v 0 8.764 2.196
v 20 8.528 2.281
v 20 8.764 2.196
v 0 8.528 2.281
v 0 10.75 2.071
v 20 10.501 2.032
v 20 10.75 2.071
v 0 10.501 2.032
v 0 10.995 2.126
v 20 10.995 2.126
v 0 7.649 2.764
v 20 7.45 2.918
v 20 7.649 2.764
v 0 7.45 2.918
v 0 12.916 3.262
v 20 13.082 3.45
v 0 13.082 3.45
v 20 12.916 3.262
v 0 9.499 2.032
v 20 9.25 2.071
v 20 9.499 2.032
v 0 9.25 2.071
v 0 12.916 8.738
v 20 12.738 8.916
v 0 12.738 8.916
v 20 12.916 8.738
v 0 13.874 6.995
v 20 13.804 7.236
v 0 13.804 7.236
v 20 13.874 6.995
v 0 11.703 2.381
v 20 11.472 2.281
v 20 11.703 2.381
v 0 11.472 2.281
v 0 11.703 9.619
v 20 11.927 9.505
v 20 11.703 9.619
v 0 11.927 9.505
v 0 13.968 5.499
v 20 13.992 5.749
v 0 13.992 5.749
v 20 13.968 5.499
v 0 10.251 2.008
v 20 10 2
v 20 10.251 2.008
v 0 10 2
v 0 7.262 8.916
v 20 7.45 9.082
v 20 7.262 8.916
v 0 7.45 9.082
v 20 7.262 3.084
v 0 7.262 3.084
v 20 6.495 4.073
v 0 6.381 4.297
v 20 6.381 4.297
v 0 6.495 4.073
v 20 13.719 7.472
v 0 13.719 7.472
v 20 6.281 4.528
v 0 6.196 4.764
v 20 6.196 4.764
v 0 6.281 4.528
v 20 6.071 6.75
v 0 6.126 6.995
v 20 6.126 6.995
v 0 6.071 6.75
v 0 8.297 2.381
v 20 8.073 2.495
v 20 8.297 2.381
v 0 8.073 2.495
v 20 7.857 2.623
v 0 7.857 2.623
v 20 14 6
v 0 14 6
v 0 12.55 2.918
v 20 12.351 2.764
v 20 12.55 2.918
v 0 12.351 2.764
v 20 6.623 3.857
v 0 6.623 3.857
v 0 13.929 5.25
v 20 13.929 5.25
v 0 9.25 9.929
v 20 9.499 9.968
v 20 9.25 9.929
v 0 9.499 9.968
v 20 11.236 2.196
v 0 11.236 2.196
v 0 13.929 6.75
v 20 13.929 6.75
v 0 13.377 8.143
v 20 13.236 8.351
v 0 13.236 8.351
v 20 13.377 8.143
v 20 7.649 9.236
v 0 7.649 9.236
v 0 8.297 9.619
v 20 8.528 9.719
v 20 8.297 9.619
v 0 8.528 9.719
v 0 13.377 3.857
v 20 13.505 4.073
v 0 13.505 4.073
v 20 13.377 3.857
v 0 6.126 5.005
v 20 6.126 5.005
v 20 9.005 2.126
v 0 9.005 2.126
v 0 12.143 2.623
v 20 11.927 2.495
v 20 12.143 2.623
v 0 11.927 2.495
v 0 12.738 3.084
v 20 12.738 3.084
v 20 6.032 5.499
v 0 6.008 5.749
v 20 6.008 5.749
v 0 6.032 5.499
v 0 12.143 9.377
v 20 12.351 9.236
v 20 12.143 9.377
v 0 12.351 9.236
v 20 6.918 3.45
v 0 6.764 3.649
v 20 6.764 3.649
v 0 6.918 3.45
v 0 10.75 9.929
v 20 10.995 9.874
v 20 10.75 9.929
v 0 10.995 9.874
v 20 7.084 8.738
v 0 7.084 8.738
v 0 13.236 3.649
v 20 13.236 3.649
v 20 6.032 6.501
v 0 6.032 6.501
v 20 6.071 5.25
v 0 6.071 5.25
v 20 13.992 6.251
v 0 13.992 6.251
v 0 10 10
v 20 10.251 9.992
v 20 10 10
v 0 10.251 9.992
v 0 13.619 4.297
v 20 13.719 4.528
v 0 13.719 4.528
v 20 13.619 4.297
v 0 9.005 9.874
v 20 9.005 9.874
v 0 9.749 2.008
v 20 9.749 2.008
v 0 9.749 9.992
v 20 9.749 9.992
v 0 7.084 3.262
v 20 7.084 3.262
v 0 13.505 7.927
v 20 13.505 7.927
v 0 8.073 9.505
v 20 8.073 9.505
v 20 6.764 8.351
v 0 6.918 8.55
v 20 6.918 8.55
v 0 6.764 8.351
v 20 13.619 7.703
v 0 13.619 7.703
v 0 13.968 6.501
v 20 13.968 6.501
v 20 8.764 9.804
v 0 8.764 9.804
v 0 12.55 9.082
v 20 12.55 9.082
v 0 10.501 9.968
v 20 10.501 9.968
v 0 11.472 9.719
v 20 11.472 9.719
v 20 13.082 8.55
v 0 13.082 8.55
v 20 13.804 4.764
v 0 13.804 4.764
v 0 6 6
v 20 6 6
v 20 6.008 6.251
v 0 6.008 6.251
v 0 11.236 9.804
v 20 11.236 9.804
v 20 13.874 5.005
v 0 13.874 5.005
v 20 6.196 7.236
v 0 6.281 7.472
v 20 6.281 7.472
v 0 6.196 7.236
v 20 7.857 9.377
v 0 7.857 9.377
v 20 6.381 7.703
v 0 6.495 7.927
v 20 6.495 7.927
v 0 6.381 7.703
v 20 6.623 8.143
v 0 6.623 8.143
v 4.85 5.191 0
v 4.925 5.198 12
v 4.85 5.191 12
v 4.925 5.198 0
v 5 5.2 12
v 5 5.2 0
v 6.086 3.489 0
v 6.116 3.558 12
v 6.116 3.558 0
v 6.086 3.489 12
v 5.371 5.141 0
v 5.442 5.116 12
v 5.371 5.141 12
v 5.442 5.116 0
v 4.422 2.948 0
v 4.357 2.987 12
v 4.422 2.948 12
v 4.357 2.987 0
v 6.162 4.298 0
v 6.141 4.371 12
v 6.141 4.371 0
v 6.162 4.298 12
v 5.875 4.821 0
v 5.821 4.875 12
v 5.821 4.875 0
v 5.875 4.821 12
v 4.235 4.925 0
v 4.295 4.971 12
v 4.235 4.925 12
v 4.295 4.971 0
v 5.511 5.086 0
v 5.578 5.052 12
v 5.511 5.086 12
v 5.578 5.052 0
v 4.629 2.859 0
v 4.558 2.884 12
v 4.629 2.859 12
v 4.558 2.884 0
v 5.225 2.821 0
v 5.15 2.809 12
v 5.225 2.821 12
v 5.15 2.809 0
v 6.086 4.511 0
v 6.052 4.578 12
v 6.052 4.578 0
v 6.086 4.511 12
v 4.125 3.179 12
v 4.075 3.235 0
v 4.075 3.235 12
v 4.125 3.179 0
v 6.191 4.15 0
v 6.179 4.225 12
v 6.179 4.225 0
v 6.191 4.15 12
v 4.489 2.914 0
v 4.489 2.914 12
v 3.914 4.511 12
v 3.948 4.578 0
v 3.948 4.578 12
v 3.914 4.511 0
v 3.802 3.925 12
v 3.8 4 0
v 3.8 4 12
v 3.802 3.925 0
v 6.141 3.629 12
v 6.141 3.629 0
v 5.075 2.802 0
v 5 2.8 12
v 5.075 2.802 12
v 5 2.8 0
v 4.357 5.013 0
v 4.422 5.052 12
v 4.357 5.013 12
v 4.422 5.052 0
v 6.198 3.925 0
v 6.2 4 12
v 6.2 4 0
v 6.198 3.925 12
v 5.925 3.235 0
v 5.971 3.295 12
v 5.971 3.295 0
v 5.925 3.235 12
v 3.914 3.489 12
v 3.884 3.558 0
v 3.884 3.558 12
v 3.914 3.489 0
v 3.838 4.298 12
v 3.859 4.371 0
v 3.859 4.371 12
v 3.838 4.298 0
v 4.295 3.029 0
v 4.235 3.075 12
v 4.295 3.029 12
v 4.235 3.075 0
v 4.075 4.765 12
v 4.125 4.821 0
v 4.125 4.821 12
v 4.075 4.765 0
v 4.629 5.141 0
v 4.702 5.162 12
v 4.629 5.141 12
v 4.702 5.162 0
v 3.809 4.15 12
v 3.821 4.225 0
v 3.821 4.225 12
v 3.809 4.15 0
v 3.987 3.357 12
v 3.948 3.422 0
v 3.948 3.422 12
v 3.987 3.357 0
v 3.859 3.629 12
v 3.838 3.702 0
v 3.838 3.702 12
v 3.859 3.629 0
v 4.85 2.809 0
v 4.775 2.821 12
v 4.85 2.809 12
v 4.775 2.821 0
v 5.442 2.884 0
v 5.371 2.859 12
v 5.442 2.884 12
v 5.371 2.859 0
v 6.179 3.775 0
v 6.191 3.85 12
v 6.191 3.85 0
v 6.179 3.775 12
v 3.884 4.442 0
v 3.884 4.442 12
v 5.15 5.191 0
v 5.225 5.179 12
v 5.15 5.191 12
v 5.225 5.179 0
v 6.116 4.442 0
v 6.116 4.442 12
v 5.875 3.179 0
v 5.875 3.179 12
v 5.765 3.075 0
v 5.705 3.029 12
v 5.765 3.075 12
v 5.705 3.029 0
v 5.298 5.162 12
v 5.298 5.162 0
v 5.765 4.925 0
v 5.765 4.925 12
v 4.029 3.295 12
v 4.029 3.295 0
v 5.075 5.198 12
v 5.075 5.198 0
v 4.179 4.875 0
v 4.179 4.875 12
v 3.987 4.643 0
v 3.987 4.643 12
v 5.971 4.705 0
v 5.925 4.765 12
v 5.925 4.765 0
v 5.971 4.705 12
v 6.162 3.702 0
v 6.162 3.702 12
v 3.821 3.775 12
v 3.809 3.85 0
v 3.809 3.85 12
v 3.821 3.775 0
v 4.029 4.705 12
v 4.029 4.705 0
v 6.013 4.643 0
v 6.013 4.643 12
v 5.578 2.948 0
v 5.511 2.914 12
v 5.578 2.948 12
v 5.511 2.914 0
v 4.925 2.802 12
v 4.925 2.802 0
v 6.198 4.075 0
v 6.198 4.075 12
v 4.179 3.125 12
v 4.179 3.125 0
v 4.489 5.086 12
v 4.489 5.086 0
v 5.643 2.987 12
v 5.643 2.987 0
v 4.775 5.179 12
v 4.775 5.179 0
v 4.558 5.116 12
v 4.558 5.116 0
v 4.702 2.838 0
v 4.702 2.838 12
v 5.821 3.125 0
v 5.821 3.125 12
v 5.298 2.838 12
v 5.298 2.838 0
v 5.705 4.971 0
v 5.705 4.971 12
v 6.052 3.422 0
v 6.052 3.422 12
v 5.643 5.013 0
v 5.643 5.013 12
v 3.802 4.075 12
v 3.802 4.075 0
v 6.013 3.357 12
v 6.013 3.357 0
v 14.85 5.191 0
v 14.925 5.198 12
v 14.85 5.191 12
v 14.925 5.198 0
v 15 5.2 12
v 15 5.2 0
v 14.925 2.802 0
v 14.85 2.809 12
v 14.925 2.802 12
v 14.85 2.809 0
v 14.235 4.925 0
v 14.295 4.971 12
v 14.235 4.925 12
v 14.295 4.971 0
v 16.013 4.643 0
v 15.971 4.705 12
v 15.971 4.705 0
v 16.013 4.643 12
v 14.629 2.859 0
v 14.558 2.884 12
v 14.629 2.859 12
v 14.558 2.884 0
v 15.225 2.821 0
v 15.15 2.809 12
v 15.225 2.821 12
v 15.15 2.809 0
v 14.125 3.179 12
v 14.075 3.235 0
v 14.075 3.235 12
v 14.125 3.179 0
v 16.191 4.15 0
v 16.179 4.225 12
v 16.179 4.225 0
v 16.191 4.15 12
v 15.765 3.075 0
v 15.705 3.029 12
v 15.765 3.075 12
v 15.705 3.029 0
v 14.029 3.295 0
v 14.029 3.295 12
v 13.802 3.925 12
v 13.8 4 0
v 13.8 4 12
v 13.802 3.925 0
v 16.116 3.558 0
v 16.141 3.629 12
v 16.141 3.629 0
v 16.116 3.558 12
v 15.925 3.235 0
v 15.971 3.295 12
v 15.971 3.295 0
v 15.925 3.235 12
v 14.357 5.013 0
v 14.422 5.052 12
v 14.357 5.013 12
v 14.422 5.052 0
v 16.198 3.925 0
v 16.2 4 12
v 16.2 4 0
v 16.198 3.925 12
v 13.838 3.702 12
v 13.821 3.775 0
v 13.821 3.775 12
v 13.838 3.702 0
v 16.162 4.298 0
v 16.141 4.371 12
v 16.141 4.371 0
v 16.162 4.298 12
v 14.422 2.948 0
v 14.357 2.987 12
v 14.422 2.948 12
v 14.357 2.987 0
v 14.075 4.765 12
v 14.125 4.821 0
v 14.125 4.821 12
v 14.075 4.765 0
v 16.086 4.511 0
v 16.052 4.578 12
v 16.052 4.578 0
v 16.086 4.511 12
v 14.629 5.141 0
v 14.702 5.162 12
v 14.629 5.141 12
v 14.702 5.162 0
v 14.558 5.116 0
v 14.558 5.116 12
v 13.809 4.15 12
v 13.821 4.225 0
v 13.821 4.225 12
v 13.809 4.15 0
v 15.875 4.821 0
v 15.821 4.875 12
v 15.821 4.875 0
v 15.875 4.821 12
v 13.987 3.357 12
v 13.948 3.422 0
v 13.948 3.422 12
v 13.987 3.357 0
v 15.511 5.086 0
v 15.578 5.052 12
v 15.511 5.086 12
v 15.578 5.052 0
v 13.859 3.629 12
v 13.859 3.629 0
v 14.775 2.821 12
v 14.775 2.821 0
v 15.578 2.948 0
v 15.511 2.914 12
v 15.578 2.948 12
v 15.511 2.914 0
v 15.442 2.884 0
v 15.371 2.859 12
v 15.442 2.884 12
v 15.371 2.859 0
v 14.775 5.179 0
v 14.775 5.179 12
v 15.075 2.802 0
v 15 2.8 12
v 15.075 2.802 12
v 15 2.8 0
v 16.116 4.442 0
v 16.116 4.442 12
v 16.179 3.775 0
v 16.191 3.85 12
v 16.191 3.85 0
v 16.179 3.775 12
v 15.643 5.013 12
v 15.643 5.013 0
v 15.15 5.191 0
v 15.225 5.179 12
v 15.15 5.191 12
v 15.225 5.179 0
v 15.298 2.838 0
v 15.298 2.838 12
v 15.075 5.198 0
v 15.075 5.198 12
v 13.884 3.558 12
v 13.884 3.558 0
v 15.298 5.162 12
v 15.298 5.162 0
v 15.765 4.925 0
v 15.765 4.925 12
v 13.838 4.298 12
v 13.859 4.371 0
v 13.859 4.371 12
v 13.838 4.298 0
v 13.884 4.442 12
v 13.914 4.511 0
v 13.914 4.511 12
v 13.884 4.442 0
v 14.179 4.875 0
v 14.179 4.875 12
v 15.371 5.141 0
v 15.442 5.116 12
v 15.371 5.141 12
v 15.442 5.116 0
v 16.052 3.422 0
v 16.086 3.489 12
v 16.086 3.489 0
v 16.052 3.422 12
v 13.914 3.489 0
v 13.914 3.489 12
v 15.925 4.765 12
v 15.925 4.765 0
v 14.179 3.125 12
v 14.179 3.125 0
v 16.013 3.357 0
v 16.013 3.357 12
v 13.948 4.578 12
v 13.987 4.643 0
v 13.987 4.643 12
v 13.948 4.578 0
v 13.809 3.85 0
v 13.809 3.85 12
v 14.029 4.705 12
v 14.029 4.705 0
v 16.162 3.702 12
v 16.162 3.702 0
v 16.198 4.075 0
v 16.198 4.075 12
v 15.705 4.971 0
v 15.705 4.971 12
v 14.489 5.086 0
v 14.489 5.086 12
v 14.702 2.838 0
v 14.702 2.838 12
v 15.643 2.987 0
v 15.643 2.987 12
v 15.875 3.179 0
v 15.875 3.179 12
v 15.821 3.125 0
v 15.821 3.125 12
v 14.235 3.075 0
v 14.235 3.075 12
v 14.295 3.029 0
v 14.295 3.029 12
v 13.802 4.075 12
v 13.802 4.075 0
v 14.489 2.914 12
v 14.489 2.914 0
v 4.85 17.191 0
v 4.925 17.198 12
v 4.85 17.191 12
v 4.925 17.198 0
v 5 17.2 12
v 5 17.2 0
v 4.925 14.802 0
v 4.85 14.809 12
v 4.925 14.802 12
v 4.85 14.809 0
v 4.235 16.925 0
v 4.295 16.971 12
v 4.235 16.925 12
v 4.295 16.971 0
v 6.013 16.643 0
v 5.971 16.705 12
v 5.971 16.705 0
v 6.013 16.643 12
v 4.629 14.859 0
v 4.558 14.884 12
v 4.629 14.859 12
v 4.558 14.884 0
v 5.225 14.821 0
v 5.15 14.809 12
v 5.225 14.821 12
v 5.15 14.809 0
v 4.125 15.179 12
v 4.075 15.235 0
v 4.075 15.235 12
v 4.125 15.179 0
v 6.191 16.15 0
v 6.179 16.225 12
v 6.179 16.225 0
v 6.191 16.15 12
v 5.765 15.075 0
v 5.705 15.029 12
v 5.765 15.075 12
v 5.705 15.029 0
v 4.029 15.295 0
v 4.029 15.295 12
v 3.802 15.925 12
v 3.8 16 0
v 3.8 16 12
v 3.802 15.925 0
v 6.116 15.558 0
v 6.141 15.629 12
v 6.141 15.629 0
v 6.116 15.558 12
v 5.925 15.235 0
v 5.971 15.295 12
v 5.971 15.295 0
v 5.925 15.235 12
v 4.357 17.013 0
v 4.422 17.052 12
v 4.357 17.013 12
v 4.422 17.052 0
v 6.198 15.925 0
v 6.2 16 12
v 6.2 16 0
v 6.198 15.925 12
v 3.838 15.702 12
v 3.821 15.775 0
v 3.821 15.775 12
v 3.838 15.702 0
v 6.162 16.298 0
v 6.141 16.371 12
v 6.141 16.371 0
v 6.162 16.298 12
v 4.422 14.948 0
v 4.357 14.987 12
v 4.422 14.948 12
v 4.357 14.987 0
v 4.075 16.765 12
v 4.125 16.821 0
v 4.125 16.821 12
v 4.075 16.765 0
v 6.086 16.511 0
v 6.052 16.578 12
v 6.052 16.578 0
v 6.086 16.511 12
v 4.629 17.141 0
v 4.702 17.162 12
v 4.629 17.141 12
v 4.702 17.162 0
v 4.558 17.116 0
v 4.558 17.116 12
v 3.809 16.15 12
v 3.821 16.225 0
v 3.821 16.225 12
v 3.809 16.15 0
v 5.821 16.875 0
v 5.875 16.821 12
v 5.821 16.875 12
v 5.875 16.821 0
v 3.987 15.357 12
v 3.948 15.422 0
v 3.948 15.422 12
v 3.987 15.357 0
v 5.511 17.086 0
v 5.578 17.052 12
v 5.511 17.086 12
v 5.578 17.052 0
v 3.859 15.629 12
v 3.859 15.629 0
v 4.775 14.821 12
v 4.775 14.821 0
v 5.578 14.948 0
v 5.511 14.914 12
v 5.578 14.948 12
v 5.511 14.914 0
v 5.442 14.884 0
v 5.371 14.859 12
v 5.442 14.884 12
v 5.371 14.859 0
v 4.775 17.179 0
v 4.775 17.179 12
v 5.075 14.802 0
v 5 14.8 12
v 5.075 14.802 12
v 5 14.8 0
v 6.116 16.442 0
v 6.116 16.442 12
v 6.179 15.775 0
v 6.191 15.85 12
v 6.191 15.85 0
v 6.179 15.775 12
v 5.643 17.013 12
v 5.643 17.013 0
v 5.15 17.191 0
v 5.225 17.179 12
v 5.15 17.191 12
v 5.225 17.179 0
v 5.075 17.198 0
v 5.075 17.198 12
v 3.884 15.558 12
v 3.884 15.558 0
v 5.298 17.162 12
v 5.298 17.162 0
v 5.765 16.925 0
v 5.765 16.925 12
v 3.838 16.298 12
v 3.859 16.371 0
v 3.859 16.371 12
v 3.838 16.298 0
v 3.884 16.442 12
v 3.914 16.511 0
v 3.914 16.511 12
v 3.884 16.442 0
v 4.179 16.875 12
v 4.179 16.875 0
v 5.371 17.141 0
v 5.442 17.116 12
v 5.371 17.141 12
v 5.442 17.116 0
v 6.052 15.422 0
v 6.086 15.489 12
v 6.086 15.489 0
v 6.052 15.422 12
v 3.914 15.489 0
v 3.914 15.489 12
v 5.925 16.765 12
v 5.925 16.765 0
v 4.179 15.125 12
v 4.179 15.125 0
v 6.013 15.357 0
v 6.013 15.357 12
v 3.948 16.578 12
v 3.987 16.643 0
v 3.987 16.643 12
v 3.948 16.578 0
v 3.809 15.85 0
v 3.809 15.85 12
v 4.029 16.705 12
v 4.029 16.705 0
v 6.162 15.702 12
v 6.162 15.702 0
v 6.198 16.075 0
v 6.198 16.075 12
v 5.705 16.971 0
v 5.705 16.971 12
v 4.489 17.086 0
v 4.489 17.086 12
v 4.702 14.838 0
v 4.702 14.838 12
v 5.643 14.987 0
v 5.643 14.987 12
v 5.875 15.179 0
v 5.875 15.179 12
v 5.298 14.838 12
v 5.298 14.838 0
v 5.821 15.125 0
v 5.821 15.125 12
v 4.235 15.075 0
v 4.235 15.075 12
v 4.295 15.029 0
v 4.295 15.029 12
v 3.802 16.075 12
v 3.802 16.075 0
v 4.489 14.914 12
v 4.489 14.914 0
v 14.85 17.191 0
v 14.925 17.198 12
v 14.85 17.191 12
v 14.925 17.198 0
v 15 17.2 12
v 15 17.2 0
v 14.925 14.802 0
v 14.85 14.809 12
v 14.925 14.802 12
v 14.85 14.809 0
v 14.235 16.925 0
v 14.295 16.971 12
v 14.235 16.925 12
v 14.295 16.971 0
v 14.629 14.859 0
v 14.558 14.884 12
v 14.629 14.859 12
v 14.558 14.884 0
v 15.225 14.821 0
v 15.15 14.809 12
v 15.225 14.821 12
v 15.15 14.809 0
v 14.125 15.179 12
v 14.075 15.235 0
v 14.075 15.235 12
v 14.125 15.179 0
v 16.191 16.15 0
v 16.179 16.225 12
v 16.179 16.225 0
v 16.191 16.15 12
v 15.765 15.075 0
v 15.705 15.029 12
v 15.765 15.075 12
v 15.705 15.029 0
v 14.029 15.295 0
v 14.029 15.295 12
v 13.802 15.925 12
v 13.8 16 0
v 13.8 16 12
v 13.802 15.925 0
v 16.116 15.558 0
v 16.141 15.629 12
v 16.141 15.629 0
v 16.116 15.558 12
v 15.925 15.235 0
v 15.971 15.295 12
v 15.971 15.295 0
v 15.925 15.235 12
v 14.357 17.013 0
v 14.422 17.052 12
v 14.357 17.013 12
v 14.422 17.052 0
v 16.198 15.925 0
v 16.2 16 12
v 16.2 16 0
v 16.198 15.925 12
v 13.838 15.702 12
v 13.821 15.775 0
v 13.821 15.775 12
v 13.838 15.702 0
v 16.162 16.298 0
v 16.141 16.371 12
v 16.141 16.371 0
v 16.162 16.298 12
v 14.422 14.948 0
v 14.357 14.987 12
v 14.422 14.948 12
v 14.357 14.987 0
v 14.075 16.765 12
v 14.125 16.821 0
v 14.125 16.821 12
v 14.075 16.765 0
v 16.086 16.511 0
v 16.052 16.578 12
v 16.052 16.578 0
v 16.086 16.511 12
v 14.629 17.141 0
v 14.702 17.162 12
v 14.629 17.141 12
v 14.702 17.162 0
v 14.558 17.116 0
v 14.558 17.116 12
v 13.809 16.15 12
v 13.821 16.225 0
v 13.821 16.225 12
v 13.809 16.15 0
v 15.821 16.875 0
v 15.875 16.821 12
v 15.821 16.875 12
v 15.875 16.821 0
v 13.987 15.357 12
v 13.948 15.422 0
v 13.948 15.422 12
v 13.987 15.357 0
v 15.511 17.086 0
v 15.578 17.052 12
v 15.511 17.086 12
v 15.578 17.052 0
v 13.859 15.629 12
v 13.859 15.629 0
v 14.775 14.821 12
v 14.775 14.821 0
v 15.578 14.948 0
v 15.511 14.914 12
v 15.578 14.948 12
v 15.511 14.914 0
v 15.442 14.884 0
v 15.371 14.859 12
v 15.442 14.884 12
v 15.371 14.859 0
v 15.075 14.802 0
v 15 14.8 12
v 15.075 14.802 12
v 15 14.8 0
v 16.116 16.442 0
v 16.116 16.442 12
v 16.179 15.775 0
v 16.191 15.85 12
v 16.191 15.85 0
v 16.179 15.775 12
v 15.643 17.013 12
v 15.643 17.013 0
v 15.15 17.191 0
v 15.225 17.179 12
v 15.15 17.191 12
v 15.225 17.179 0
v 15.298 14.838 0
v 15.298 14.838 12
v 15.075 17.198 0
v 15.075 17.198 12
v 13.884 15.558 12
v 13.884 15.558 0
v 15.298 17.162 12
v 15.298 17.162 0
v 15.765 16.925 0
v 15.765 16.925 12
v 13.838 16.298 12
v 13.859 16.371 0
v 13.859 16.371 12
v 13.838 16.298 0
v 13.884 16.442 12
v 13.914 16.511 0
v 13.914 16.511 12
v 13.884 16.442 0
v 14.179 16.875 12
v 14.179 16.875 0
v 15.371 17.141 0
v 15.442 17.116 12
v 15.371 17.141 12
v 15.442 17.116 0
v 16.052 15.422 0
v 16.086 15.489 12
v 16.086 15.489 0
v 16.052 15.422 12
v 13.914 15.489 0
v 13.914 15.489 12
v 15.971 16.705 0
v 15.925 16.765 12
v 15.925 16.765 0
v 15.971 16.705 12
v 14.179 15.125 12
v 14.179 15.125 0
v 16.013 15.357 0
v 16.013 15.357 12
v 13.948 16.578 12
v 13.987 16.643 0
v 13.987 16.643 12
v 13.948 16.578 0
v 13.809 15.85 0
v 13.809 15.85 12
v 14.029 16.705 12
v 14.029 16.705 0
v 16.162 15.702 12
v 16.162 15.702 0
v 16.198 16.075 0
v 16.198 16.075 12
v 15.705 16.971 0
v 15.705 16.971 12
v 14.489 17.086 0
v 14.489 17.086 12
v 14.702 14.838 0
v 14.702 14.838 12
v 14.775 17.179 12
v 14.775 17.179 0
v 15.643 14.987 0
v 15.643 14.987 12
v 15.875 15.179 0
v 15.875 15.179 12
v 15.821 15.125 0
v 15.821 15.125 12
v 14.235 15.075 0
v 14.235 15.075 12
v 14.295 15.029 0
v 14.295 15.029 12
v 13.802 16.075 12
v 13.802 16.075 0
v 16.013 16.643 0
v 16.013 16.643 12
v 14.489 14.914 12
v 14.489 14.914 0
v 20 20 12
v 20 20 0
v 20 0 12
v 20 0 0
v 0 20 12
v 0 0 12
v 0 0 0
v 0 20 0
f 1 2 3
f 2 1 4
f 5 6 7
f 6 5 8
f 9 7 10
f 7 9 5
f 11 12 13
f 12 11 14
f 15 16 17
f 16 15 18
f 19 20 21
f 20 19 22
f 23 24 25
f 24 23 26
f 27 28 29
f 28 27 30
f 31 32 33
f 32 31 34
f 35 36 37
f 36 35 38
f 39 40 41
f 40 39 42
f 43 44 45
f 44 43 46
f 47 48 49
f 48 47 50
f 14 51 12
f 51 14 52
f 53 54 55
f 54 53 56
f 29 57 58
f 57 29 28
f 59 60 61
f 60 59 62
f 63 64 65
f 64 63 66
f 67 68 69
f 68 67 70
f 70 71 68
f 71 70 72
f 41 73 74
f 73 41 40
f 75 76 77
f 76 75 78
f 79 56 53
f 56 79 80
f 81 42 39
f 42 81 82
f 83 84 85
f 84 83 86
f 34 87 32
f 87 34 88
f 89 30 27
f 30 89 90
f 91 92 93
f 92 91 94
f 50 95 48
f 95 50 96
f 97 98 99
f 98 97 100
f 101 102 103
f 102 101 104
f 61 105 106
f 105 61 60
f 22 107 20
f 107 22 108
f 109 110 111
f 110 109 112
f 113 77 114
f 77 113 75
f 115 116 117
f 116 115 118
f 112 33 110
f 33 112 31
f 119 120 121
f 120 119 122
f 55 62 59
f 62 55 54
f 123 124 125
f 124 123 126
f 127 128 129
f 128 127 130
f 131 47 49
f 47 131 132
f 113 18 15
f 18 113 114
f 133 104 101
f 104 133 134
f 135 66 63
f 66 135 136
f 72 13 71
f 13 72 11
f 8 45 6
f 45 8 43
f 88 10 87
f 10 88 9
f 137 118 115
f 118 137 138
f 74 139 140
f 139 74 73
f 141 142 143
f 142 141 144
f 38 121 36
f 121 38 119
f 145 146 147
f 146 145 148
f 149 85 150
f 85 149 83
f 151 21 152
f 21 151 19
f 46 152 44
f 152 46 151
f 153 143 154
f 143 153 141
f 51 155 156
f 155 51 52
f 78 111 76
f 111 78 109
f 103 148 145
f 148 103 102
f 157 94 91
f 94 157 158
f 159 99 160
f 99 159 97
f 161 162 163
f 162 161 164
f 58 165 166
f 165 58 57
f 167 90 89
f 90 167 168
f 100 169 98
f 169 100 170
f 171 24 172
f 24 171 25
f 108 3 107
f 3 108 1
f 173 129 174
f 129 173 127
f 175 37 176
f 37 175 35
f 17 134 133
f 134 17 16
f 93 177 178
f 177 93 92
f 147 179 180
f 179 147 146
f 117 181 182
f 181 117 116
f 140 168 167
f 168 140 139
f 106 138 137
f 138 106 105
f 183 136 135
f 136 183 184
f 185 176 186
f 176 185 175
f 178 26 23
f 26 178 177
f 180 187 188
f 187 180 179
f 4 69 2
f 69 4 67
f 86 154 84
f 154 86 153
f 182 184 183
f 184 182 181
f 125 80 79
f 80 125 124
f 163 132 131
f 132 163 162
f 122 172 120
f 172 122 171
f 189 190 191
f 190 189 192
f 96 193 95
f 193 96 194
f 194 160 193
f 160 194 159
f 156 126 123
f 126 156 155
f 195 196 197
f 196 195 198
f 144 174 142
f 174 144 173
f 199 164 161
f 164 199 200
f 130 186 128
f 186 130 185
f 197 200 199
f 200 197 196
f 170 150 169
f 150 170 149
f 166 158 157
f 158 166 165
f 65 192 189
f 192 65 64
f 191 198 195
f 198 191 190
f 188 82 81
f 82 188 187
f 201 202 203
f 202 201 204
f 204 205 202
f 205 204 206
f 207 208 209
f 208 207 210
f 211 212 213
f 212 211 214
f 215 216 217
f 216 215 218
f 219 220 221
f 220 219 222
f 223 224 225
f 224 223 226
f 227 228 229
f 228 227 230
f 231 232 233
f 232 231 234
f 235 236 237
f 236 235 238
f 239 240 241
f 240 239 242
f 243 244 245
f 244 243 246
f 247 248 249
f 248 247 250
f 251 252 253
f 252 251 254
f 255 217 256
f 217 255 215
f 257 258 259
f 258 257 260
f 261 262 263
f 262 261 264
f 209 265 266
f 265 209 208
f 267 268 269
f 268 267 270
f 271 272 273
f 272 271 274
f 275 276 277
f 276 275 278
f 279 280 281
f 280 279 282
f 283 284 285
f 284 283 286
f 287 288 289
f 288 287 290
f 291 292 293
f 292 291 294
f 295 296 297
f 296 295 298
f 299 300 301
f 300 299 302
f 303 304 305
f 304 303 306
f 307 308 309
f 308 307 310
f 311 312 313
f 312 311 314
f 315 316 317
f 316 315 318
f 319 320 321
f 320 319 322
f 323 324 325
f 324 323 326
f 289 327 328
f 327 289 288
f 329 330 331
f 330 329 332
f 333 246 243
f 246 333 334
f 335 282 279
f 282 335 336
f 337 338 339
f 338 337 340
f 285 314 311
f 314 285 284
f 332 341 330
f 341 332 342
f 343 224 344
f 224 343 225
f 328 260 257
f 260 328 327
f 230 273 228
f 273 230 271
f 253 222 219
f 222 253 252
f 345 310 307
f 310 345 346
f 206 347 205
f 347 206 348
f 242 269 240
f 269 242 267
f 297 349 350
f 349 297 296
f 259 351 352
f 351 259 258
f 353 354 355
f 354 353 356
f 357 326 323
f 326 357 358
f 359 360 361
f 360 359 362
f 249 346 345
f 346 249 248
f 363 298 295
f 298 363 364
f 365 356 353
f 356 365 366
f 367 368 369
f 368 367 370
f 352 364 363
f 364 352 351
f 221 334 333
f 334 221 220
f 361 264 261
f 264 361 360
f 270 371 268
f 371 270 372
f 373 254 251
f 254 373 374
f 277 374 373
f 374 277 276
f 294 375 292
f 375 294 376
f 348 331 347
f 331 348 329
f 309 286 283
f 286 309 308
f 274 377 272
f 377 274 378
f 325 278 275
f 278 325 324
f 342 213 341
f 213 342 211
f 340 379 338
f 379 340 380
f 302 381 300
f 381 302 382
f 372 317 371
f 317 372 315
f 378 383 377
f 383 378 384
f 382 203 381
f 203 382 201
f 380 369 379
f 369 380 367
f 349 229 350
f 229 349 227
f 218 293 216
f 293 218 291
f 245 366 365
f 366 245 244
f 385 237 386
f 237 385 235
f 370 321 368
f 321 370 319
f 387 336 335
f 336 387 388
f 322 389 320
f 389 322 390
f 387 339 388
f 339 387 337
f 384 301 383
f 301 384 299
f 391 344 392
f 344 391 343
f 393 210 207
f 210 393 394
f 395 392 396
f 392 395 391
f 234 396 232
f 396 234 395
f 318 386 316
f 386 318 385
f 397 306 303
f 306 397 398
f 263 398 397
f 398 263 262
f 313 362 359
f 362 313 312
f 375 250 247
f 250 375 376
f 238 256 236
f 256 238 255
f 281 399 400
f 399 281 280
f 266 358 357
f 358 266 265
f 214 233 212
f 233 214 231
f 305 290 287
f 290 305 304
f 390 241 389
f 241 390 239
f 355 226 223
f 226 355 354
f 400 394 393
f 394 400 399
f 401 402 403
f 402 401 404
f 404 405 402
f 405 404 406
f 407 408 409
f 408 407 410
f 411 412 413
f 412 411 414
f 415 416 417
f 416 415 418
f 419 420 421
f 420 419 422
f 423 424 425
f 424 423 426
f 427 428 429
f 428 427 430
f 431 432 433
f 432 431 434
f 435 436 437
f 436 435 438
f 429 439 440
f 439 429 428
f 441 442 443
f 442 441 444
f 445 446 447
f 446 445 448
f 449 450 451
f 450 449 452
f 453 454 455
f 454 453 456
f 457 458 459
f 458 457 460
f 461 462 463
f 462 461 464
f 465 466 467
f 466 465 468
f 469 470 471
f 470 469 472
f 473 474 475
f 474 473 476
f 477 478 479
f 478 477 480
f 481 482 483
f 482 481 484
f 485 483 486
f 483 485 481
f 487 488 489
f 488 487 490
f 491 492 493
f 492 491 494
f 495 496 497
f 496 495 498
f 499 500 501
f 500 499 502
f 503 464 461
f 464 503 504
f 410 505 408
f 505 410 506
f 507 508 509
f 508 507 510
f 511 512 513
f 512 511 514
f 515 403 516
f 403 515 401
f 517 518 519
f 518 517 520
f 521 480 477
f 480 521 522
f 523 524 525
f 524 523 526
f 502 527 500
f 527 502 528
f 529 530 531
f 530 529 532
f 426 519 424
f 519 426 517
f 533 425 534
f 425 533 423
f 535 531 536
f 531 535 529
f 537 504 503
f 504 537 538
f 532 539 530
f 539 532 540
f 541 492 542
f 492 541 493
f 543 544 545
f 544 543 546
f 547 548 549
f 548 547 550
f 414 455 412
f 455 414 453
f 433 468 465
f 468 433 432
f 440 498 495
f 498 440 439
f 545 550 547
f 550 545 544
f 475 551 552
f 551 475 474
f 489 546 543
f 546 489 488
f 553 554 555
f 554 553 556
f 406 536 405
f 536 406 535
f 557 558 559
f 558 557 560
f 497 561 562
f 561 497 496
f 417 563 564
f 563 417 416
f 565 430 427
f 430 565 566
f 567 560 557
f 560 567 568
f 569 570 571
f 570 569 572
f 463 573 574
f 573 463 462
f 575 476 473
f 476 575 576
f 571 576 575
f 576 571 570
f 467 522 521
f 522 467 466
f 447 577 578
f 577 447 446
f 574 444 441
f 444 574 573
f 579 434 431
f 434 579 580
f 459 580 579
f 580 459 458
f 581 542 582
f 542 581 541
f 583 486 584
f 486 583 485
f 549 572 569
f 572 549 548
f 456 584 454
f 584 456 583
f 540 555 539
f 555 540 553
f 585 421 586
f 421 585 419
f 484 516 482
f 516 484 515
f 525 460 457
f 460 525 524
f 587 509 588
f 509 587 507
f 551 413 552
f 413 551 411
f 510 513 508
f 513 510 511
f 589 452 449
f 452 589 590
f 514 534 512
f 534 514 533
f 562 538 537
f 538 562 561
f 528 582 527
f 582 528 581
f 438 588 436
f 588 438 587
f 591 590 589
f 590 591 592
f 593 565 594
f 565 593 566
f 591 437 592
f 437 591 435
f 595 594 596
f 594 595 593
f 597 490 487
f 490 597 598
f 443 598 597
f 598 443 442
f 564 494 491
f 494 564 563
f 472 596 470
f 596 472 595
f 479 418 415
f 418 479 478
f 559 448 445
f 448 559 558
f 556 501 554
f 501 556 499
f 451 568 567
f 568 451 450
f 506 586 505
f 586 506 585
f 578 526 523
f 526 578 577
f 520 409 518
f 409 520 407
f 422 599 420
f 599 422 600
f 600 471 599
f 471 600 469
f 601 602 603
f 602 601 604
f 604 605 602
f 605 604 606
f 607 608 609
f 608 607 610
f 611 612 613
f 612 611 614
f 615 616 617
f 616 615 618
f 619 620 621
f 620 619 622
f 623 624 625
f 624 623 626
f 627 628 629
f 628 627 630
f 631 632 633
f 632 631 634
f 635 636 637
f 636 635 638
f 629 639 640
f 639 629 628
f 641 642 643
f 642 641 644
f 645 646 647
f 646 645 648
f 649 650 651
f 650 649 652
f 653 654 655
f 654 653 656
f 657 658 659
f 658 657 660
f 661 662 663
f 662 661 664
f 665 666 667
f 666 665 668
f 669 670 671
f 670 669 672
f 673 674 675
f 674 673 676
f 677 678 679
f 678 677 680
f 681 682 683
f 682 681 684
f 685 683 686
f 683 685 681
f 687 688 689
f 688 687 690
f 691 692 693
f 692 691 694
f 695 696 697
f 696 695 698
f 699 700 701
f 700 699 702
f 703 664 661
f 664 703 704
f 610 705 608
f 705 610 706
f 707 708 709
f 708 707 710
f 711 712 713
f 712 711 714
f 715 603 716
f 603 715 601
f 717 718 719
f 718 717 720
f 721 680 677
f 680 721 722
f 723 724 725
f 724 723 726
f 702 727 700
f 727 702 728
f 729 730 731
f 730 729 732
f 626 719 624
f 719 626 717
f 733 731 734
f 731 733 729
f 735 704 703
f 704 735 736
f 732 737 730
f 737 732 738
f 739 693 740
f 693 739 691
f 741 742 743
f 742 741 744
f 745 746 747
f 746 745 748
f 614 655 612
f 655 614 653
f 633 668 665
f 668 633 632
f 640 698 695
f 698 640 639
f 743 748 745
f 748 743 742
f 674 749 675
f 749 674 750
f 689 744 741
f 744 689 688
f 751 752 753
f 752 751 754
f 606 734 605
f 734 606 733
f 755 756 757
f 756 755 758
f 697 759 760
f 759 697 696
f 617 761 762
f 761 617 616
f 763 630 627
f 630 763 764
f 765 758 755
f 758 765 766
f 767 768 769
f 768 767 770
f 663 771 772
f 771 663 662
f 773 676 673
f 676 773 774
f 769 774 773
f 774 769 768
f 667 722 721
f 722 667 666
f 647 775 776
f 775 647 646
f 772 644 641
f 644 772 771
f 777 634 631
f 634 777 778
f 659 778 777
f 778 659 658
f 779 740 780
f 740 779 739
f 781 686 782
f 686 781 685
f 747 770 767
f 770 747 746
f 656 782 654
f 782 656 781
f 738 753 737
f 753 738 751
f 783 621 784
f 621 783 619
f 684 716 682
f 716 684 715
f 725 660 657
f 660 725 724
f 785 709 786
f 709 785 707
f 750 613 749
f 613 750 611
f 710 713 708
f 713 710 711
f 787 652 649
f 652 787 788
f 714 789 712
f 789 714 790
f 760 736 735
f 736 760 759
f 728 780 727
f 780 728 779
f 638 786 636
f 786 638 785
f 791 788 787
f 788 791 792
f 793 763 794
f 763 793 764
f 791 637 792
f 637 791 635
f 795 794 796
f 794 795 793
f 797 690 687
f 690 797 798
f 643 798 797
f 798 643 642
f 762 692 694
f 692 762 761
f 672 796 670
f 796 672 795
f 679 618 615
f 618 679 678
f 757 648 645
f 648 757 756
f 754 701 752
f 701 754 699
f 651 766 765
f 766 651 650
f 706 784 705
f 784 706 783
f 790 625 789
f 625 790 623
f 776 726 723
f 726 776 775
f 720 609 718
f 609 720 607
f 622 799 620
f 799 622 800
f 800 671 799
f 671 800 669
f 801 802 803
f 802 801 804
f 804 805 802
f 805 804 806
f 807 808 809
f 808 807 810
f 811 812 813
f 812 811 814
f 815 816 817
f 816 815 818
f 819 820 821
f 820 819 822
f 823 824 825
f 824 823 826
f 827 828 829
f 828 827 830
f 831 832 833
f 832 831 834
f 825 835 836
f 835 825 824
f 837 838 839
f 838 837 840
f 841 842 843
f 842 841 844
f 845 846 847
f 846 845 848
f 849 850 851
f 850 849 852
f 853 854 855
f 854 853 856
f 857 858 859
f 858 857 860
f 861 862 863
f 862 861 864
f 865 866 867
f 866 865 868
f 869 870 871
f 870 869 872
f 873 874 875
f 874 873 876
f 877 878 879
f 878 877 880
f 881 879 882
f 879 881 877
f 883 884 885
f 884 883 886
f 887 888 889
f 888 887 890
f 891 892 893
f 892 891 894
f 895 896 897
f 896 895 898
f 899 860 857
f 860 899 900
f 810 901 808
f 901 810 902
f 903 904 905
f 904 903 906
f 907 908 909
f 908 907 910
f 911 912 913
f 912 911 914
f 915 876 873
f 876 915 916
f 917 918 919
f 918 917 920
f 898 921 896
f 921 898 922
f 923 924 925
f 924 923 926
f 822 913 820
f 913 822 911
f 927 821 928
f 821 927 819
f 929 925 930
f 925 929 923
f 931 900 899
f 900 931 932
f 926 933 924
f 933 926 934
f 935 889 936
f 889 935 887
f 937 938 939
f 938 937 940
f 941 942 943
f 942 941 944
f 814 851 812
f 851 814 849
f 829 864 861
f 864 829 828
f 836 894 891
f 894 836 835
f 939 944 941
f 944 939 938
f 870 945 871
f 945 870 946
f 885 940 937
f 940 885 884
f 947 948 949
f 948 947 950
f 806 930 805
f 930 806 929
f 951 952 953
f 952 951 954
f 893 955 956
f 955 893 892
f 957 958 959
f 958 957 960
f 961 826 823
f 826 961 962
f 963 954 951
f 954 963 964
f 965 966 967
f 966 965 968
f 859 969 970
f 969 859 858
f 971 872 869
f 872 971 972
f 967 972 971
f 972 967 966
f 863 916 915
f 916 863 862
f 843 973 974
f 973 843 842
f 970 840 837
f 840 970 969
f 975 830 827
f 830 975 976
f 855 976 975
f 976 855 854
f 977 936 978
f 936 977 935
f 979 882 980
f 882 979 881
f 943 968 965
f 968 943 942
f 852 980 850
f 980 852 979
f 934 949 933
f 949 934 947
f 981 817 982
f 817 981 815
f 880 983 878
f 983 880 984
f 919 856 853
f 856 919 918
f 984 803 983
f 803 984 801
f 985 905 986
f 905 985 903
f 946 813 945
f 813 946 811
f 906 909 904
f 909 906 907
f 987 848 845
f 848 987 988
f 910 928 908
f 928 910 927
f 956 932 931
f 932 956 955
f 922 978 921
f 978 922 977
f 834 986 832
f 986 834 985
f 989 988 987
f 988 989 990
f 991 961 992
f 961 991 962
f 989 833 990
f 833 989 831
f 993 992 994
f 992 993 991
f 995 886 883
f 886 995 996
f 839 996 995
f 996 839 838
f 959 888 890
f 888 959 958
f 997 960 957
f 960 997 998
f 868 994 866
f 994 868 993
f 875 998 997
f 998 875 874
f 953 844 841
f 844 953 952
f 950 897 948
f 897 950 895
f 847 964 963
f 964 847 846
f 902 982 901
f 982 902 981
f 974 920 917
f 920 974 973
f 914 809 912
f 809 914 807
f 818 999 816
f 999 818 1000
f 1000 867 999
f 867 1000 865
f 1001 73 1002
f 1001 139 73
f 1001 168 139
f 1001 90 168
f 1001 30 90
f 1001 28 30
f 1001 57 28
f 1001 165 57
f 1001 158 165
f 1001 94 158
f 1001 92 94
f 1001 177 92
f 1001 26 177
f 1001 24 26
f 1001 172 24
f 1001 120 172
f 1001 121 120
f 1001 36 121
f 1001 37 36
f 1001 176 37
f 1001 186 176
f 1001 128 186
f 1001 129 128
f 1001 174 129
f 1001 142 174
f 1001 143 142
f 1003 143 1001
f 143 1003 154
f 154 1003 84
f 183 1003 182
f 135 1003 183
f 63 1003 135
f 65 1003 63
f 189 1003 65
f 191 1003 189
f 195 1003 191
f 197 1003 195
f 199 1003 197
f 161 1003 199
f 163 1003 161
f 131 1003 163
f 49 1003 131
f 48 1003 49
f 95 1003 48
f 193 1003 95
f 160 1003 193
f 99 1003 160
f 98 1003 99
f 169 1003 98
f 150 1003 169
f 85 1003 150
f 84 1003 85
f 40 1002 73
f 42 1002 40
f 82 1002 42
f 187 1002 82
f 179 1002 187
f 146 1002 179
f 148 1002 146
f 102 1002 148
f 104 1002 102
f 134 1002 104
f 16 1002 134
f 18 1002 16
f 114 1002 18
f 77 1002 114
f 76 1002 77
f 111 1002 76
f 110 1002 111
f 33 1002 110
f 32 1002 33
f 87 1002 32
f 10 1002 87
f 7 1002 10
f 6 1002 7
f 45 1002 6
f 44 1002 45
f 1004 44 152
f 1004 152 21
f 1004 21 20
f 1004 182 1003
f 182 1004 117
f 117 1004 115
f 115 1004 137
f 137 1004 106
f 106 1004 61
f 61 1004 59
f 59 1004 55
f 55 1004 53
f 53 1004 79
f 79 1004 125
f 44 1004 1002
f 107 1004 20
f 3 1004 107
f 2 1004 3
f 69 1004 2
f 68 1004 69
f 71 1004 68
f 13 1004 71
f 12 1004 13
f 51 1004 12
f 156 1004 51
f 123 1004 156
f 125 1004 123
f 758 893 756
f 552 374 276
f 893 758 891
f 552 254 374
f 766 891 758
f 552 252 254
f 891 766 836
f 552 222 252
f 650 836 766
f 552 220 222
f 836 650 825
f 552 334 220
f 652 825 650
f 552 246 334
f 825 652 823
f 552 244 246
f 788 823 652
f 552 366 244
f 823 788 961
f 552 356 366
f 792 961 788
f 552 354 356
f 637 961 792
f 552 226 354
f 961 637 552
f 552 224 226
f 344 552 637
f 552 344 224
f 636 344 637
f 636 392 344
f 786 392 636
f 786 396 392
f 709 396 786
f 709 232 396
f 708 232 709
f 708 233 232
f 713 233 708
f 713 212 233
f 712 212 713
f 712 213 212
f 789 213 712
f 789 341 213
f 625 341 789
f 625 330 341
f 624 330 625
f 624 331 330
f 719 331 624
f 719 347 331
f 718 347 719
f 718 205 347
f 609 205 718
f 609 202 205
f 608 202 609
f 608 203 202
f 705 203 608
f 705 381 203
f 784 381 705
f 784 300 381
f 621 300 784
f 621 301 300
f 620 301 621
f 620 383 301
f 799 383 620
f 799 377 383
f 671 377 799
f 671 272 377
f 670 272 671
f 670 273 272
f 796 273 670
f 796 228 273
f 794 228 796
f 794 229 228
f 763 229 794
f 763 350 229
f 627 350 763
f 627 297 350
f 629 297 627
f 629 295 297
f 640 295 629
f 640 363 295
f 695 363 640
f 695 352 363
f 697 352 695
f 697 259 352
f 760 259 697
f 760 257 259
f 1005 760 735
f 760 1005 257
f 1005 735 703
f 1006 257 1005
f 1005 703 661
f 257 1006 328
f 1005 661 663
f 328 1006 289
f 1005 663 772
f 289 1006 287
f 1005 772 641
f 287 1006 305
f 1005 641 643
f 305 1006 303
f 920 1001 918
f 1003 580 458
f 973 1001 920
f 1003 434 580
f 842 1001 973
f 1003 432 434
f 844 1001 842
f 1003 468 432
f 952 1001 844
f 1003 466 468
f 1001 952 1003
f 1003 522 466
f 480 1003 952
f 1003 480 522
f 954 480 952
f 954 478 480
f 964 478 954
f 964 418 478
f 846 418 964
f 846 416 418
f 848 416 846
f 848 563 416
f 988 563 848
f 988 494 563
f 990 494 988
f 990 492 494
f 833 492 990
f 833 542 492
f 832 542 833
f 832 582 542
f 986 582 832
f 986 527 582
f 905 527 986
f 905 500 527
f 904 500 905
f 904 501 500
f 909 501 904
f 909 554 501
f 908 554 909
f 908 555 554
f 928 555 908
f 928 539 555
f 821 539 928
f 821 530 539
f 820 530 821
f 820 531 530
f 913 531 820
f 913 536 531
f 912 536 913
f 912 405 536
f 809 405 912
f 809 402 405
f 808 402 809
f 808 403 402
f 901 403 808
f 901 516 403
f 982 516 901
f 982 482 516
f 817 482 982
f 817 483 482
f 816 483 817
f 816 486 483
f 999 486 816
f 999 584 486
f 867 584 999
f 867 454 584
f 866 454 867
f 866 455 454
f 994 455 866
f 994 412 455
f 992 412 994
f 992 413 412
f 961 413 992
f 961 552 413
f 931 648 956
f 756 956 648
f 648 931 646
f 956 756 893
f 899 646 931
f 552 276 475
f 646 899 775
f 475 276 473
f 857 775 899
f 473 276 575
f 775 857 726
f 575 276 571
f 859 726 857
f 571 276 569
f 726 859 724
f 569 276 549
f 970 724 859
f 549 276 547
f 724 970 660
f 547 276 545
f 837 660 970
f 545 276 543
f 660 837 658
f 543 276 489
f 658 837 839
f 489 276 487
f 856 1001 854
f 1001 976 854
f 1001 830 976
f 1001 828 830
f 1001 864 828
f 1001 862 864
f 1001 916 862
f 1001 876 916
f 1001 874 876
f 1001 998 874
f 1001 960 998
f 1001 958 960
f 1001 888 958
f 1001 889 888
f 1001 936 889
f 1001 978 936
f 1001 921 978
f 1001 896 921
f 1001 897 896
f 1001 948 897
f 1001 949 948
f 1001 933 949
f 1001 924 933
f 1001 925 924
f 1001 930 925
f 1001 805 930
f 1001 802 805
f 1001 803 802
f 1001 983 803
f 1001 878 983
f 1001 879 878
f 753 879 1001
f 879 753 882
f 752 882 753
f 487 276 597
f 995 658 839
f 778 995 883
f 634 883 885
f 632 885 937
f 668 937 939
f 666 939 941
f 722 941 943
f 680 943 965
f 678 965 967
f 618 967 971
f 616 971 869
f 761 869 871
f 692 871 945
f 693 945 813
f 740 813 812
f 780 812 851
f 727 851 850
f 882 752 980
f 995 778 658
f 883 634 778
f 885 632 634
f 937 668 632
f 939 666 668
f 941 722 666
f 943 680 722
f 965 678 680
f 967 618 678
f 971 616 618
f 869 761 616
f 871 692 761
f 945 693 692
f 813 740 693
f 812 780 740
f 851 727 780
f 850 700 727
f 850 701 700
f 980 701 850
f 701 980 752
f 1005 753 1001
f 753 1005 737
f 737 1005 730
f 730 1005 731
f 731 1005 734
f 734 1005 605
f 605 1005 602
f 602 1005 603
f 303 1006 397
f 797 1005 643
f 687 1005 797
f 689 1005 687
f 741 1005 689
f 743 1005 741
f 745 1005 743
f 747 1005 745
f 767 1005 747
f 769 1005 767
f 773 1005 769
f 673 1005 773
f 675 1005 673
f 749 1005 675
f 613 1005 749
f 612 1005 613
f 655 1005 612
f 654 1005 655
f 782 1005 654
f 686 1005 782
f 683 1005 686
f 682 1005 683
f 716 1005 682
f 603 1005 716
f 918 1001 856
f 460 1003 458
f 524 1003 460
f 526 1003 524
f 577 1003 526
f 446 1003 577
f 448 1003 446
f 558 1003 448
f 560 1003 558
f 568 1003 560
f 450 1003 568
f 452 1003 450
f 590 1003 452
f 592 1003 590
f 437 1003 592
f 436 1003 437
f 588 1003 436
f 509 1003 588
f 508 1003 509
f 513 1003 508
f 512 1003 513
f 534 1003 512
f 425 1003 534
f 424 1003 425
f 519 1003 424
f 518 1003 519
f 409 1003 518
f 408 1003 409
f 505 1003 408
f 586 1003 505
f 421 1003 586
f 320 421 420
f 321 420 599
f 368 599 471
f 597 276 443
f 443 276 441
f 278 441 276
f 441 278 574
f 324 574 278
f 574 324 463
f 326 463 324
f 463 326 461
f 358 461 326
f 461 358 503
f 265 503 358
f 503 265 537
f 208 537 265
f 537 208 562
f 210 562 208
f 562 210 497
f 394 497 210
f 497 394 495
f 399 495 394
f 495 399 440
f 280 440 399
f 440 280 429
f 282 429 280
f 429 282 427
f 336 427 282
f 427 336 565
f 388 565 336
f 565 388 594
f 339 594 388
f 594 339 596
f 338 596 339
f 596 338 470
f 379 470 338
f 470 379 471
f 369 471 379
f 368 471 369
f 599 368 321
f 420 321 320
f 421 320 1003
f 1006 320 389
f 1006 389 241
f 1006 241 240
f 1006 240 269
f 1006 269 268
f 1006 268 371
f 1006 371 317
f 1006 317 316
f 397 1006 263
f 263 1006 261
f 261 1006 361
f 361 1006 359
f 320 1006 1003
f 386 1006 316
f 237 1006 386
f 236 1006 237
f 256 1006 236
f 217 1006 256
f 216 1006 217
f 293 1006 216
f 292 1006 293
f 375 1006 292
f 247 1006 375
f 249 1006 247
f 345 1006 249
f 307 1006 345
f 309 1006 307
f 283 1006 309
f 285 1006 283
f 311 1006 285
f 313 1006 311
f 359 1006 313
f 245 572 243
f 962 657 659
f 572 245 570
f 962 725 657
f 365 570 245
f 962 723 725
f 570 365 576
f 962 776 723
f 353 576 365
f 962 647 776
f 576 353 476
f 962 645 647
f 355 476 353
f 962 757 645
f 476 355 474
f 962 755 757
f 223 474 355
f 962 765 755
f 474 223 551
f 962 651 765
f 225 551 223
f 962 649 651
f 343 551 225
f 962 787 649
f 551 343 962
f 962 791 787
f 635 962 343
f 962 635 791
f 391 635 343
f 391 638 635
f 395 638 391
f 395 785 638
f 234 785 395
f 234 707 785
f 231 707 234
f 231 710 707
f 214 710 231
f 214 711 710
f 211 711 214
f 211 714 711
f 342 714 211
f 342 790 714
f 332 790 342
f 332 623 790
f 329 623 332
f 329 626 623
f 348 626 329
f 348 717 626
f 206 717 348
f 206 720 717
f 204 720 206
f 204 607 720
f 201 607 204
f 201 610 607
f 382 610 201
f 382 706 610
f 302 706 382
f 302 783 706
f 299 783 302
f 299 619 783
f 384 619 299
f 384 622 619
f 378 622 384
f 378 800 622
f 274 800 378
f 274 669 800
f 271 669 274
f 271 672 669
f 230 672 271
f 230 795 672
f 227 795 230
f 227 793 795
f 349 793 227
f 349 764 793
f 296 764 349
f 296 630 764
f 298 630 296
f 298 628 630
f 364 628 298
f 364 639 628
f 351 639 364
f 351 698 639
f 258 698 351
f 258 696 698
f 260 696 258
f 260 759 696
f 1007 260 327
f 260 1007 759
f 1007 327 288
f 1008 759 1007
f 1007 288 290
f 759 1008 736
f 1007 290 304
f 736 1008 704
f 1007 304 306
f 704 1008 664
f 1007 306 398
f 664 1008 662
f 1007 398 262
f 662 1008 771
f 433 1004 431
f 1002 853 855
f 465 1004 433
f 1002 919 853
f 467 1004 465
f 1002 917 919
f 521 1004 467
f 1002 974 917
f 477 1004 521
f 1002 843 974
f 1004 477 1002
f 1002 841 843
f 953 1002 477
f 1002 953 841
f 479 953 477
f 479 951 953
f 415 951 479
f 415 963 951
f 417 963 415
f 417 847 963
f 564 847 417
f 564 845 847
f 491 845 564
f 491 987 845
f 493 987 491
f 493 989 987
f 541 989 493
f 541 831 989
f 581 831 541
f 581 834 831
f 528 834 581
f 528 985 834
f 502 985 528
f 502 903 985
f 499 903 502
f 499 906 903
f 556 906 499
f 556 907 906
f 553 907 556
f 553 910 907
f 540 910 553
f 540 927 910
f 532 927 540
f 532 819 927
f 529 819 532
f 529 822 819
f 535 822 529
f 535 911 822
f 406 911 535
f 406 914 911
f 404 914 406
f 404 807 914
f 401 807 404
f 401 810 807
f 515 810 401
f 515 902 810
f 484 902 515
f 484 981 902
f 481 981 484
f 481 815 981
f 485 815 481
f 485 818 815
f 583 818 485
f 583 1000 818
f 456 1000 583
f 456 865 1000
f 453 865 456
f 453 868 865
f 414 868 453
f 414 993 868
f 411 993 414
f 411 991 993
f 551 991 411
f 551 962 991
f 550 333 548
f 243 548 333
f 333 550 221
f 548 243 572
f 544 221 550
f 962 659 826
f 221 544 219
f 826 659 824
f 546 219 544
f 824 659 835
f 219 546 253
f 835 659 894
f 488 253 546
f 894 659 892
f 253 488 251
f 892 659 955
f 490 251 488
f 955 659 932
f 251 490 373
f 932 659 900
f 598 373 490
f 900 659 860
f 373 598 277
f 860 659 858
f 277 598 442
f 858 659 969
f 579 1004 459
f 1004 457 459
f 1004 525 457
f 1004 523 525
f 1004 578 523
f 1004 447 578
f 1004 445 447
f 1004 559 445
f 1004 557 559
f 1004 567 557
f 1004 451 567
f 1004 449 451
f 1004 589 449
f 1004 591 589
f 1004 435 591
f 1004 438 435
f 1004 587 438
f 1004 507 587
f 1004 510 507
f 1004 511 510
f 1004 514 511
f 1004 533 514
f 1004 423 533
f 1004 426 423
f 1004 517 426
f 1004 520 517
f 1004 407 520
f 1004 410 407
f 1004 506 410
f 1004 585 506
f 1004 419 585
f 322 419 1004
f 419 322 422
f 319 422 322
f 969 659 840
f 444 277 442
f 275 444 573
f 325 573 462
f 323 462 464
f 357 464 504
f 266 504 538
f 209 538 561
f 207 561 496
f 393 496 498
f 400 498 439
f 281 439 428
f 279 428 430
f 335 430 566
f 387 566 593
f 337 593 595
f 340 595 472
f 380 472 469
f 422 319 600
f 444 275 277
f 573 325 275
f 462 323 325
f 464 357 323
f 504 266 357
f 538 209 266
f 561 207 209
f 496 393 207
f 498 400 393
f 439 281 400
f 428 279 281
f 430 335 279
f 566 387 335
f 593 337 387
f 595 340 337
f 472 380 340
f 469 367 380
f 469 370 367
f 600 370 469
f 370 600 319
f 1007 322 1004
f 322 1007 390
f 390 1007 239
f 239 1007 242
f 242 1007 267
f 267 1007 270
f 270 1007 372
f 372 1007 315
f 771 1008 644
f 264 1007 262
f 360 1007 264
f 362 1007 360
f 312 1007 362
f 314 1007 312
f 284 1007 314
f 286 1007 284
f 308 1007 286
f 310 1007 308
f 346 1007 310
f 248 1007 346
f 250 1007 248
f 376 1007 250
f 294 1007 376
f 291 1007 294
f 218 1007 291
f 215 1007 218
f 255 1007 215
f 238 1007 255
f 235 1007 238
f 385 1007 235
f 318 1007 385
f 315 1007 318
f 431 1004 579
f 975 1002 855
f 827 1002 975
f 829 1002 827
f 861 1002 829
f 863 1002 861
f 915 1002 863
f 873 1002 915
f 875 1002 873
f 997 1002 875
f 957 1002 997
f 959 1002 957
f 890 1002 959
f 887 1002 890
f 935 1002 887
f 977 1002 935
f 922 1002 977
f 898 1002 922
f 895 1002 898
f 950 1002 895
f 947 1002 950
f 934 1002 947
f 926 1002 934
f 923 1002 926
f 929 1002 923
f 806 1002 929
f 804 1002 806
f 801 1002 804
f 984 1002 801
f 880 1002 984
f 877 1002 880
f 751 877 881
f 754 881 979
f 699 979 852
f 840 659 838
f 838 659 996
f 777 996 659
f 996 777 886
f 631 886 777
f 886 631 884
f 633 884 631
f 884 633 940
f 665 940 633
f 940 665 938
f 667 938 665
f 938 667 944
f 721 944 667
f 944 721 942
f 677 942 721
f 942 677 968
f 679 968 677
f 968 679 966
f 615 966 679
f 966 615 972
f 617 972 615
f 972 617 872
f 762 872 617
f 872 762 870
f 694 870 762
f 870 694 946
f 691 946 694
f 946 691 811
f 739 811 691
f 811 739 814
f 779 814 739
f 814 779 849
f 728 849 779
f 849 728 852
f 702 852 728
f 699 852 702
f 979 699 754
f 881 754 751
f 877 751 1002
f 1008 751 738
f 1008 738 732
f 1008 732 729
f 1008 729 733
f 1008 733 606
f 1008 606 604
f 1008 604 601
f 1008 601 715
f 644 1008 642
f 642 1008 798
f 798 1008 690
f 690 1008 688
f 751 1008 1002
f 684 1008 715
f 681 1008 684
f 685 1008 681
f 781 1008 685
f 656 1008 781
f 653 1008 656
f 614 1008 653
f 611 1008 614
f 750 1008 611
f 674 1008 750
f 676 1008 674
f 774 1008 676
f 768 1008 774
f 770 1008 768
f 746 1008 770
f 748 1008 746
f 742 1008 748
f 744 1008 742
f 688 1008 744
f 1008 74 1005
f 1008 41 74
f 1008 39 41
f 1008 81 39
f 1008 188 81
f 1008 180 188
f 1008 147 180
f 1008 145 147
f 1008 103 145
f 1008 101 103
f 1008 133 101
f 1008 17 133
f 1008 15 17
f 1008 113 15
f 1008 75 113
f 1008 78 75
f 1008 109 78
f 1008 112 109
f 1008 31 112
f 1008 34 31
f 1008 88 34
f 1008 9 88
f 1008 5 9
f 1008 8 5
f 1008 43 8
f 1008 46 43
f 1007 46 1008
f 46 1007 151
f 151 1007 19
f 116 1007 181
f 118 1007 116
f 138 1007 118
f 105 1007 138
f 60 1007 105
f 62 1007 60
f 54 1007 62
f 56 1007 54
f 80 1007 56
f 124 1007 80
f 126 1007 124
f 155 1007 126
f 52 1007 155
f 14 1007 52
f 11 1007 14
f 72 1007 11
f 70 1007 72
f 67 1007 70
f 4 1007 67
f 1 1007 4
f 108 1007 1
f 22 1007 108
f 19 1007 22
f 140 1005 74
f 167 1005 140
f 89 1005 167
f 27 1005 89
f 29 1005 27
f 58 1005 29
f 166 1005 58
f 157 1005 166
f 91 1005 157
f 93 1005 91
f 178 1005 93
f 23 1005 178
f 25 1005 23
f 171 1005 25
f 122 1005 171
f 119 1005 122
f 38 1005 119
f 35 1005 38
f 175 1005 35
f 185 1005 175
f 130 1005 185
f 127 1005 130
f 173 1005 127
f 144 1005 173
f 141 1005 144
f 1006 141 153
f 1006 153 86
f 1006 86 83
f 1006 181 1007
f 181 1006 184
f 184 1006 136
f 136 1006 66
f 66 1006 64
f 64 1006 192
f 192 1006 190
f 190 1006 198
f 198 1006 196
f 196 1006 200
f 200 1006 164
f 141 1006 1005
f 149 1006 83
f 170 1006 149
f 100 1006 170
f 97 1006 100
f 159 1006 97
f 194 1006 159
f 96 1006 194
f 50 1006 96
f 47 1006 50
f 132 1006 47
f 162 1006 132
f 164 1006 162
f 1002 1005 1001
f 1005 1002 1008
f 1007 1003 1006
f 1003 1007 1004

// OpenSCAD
difference(){
	union(){ 

        translate([0,0,0]){
           cube([20,20,12], center=false);
        }                
	}
	union() {
        translate([0,10,6]){
            rotate([0,90,0]){
                cylinder(h=200, r=4, $fn=100, center=true);
            }   
        }
        translate([5,4,0]){
            rotate([0,0,90]){
                cylinder(h=200, r=1.2, $fn=100, center=true);
            }   
        }
        translate([15,4,0]){
            rotate([0,0,90]){
                cylinder(h=200, r=1.2, $fn=100, center=true);
            }   
        }
        
        translate([5,16,0]){
            rotate([0,0,90]){
                cylinder(h=200, r=1.2, $fn=100, center=true);
            }   
        }
        translate([15,16,0]){
            rotate([0,0,90]){
                cylinder(h=200, r=1.2, $fn=100, center=true);
            }   
        }
        
	}
}
